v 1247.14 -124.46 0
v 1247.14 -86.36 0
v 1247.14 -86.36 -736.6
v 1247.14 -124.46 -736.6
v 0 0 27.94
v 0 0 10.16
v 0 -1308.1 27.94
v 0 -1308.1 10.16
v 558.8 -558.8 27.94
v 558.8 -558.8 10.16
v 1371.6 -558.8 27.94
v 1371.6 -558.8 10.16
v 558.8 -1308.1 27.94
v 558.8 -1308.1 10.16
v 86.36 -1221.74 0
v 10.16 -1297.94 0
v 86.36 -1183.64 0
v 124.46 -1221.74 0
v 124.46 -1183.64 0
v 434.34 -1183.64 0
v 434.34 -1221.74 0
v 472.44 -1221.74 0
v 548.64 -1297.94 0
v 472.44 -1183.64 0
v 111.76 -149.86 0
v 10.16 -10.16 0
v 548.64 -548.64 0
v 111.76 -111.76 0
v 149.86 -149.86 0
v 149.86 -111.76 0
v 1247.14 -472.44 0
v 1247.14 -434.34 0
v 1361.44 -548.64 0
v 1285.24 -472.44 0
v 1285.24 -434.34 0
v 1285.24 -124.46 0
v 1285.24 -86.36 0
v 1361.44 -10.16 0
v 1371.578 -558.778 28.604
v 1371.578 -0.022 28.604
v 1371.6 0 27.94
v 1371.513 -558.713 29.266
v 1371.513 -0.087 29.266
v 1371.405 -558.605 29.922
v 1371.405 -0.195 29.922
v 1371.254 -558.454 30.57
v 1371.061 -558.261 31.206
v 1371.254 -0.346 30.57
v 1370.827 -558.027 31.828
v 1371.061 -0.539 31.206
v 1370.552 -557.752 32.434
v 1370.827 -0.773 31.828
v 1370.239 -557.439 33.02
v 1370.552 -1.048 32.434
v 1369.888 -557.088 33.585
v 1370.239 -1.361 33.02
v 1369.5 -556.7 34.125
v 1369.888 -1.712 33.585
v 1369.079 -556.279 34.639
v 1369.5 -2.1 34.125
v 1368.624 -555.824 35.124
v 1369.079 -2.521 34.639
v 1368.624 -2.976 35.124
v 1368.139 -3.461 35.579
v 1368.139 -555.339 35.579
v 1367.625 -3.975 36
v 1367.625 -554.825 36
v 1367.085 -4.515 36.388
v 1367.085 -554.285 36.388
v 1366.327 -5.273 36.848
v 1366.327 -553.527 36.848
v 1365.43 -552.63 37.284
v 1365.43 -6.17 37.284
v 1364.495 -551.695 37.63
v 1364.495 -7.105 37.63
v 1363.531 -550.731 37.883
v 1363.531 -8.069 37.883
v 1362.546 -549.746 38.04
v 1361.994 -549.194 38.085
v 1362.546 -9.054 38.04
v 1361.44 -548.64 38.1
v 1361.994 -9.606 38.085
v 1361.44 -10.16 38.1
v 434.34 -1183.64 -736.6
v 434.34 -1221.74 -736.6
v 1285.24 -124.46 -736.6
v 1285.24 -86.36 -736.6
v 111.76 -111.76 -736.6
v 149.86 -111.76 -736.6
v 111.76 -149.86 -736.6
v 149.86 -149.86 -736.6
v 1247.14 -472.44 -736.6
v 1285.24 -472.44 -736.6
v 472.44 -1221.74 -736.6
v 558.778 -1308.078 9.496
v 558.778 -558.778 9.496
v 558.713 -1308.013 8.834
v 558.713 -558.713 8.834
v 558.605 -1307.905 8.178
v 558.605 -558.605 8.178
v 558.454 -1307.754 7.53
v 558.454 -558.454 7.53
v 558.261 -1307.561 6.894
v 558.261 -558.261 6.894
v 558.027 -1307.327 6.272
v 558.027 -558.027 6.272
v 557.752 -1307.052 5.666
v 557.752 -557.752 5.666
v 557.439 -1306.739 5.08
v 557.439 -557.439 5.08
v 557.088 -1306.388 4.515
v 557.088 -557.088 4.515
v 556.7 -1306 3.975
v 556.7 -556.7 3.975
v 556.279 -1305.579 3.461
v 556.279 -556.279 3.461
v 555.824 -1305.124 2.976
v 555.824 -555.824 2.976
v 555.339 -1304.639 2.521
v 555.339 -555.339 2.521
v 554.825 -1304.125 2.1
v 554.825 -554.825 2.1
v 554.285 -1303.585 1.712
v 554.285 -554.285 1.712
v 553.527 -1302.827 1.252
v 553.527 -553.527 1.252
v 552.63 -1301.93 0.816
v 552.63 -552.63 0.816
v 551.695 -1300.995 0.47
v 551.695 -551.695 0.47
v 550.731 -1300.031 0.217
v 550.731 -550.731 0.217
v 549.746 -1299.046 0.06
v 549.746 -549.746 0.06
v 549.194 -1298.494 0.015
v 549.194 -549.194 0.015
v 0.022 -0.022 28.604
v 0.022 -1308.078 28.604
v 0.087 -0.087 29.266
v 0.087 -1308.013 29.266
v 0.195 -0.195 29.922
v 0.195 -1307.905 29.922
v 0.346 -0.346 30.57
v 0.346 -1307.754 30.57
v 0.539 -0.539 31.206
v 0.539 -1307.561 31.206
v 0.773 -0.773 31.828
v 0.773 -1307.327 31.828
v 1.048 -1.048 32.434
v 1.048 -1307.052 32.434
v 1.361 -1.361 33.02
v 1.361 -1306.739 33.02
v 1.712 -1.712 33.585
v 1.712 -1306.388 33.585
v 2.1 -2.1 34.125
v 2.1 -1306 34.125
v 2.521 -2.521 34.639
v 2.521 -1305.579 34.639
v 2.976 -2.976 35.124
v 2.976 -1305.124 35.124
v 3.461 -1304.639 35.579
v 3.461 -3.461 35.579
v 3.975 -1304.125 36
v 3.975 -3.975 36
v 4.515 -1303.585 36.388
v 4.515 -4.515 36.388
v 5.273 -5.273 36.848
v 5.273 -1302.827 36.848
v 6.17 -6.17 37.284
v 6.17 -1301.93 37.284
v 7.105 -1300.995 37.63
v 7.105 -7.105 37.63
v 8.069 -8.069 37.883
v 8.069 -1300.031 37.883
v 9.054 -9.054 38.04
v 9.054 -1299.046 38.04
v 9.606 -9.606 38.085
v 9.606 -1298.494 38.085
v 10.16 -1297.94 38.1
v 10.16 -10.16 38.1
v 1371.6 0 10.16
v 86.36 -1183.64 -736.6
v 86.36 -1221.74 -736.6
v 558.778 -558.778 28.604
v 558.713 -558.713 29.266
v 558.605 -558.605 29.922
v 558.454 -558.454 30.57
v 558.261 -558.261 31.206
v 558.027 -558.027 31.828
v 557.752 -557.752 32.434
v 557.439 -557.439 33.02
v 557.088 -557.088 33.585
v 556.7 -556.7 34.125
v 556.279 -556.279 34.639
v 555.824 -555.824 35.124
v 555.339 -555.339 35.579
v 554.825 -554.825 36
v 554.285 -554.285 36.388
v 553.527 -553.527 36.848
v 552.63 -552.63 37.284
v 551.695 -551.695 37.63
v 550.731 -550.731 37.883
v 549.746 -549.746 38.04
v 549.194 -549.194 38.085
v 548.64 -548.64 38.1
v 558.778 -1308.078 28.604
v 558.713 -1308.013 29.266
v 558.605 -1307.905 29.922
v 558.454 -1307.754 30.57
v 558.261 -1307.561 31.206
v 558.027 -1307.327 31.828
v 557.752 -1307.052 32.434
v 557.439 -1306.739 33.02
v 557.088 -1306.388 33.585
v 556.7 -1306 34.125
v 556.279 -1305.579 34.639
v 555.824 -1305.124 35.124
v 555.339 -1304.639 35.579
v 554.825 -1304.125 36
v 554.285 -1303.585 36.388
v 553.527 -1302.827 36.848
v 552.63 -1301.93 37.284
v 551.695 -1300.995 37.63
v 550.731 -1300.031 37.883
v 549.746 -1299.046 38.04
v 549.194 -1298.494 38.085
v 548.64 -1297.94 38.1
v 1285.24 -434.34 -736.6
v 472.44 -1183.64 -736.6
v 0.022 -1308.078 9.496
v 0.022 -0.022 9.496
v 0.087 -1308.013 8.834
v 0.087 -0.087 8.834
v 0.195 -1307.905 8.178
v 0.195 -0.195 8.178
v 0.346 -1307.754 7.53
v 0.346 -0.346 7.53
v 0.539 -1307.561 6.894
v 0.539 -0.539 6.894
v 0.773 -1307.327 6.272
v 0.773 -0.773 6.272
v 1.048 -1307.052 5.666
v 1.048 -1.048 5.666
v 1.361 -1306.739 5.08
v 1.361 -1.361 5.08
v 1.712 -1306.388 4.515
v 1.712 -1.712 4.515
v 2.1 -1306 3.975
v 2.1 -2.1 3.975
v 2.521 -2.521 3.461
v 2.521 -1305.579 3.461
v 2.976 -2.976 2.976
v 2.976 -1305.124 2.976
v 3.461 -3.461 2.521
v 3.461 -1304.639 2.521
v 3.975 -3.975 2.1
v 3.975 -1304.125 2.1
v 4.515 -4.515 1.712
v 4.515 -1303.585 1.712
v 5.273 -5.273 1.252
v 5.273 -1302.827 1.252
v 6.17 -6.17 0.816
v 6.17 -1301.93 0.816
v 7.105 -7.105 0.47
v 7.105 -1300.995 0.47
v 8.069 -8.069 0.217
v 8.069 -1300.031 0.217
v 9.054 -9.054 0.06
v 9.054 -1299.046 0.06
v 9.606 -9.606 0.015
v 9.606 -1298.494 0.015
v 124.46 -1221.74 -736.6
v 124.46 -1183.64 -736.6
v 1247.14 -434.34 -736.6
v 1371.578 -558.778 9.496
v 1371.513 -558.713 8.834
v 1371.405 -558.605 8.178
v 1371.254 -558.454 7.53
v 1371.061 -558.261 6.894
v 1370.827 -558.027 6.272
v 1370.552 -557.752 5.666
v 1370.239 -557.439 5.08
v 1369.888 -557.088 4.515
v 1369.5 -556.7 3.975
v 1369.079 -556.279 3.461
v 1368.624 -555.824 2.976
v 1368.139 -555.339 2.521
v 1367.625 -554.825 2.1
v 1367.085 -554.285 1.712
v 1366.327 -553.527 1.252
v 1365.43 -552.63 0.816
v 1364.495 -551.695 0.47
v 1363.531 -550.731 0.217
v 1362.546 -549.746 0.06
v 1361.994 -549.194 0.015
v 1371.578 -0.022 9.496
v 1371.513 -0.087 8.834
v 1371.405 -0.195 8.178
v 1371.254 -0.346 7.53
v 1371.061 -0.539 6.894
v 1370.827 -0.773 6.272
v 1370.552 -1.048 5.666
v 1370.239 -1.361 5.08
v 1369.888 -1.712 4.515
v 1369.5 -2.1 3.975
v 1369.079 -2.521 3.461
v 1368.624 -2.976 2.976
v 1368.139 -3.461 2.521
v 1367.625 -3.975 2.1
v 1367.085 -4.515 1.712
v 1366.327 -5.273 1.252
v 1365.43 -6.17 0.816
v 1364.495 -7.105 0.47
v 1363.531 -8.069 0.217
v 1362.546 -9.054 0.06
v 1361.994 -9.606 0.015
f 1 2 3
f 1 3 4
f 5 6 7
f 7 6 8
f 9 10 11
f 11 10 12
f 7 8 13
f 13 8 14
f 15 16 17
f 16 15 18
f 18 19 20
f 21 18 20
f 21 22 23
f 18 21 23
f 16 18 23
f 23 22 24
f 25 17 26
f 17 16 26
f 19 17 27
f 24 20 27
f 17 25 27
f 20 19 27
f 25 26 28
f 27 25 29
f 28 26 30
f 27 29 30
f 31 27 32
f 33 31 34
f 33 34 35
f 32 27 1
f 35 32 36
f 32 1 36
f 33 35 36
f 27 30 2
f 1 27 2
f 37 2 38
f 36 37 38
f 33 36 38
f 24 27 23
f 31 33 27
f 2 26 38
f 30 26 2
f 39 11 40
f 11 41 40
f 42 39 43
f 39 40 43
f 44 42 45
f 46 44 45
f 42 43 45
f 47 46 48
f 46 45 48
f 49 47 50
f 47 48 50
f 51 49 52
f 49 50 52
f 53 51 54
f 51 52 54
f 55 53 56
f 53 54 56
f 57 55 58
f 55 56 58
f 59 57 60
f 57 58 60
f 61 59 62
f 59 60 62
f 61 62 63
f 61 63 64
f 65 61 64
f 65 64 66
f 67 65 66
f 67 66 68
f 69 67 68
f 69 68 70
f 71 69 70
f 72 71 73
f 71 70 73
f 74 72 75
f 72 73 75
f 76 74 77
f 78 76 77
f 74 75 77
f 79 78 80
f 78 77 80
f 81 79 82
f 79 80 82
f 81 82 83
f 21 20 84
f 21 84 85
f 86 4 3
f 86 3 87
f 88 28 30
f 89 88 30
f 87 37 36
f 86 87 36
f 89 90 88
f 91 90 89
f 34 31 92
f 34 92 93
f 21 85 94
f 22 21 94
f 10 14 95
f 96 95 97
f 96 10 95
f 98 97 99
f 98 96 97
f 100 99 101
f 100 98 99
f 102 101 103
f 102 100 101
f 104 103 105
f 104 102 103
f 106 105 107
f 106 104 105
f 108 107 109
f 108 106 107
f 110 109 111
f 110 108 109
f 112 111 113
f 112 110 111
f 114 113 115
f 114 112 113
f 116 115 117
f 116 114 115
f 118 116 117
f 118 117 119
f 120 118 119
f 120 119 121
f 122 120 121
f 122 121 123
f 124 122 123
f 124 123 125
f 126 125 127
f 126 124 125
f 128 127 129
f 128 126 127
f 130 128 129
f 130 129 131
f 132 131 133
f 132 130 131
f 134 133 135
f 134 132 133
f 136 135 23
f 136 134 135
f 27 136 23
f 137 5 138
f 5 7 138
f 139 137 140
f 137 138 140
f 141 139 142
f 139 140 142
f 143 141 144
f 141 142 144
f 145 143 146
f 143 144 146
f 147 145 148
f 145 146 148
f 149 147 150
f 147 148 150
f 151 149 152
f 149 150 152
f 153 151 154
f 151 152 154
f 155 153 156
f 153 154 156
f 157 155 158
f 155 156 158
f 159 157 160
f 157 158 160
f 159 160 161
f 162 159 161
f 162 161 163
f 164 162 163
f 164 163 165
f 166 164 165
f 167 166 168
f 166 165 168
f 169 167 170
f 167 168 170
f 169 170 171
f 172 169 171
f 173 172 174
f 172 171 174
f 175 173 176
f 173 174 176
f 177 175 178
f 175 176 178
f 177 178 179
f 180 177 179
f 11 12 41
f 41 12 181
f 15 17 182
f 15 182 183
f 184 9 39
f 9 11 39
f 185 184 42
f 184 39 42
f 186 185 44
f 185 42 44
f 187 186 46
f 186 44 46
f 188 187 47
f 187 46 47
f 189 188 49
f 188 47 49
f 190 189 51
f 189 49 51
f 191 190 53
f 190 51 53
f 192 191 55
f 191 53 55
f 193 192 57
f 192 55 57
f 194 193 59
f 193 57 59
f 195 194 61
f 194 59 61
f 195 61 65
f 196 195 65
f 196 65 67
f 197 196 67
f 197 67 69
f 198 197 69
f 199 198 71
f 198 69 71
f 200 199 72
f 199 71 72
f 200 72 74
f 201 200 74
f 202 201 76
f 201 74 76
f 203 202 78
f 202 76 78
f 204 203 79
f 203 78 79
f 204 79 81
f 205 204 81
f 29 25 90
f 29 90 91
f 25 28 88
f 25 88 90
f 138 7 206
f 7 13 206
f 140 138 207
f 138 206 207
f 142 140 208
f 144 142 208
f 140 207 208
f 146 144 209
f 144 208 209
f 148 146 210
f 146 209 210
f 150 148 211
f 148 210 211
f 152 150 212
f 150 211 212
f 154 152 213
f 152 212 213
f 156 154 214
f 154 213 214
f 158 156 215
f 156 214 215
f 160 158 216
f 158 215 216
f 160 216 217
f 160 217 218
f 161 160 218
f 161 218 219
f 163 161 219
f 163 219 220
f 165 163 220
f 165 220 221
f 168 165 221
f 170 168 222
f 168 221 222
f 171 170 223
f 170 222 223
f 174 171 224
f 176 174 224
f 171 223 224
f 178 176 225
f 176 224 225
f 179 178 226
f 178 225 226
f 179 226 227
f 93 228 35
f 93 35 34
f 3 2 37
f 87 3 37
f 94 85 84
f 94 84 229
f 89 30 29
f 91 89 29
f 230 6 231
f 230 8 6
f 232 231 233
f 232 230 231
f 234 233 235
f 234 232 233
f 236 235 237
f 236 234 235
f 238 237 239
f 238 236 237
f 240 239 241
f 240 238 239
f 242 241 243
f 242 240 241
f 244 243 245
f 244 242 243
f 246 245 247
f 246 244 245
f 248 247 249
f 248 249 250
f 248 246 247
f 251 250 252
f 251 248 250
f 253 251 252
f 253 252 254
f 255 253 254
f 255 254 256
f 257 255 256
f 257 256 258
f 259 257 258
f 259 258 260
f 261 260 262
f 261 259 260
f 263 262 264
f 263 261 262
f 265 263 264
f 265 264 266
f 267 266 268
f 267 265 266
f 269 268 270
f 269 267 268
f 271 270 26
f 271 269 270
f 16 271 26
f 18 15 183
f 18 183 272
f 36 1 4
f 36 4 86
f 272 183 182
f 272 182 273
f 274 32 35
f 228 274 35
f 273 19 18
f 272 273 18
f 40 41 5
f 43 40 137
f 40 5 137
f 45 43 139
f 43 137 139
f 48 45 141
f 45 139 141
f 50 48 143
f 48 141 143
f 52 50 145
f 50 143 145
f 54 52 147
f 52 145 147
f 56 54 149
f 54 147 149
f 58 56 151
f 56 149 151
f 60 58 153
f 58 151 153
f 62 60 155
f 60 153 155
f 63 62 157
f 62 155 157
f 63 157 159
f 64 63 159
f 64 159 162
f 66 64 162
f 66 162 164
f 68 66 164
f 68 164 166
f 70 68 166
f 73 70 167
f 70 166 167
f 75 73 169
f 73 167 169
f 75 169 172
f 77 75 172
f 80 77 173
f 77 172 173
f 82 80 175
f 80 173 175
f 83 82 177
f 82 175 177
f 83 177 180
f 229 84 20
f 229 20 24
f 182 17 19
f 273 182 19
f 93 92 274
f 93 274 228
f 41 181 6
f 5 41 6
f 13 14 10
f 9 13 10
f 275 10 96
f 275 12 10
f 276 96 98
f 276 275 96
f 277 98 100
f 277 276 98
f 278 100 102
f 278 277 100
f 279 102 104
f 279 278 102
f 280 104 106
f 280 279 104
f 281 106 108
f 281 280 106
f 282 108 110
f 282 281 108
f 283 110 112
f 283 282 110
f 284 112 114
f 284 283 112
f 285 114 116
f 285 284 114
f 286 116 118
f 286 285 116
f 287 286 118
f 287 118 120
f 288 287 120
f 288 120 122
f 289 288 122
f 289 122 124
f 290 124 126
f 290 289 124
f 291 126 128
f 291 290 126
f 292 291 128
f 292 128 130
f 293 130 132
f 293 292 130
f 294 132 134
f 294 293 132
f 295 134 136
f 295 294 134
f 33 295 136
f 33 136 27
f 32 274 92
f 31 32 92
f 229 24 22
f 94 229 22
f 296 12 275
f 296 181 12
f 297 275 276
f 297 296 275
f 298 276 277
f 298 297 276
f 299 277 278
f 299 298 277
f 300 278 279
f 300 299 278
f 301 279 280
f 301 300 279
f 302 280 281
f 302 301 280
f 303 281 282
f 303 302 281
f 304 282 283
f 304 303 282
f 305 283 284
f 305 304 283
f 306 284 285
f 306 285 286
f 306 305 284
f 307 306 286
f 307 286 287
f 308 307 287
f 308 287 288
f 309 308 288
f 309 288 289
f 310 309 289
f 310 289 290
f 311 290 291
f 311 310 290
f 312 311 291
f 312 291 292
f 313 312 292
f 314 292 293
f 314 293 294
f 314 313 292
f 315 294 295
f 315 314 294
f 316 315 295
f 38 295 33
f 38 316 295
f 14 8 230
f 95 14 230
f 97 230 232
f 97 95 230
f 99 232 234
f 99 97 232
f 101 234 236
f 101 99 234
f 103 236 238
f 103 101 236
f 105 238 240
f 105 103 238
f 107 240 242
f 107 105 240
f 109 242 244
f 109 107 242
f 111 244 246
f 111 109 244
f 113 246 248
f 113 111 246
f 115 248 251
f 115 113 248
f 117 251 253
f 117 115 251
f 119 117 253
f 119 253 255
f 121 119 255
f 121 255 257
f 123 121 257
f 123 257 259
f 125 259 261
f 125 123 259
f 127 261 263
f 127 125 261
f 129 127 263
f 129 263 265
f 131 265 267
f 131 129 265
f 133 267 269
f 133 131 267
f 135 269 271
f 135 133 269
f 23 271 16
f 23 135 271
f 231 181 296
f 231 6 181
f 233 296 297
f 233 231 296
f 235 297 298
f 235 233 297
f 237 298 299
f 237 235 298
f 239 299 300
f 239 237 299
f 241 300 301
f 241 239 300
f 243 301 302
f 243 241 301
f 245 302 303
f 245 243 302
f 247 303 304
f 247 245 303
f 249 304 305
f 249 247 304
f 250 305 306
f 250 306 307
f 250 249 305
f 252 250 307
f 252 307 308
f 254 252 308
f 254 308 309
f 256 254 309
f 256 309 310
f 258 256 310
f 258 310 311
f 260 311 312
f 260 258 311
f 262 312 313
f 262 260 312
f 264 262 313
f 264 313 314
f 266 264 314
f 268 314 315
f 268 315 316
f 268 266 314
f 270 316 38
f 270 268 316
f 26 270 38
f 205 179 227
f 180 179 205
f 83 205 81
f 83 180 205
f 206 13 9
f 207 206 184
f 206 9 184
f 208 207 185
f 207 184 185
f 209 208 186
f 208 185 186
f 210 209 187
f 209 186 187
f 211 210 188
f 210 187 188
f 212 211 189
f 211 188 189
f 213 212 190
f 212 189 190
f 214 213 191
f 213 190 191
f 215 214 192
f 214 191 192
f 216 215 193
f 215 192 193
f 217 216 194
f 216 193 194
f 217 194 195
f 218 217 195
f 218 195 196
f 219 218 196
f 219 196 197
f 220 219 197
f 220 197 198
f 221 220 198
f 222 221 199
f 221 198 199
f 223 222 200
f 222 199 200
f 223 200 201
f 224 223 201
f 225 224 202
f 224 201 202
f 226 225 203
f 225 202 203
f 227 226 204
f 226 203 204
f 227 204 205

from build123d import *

# Parameters (mm, degrees)
F1_DEPTH = 38.1
F2_R     = 10.16
F3_W     = 38.1
F3_H     = 38.1
F4_DEPTH = 736.6


with BuildPart() as f1:
    # F0 (on Top) → F1 (new body)
    with BuildSketch(Plane.XY):
        Polygon((1371.6, 0), (0, 0), (0, -1308.1), (558.8, -1308.1), (558.8, -558.8), (1371.6, -558.8), align=None)
    extrude(amount=F1_DEPTH)

    # F2
    f2_edges = [f1.edges().sort_by_distance(p)[0] for p in [
        (0, -654.05, 38.1),
        (279.4, -1308.1, 38.1),
        (558.8, -933.45, 38.1),
        (965.2, -558.8, 38.1),
        (1371.6, -279.4, 38.1),
        (685.8, 0, 38.1),
        (279.4, -1308.1, 0),
        (0, -654.05, 0),
        (685.8, 0, 0),
        (1371.6, -279.4, 0),
        (965.2, -558.8, 0),
        (558.8, -933.45, 0),
    ]]
    fillet(f2_edges, radius=F2_R)

    # F3 (on face) → F4 (join)
    with BuildSketch(Plane(origin=(0, 0, 0), x_dir=(1, 0, 0), z_dir=(0, 0, -1))):
        with Locations((130.81, 130.81)):
            Rectangle(F3_W, F3_H)
        with Locations((1266.19, 105.41)):
            Rectangle(F3_W, F3_H)
        with Locations((1266.19, 453.39)):
            Rectangle(F3_W, F3_H)
        with Locations((105.41, 1202.69)):
            Rectangle(F3_W, F3_H)
        with Locations((453.39, 1202.69)):
            Rectangle(F3_W, F3_H)
    extrude(amount=F4_DEPTH)


solid = f1.part
